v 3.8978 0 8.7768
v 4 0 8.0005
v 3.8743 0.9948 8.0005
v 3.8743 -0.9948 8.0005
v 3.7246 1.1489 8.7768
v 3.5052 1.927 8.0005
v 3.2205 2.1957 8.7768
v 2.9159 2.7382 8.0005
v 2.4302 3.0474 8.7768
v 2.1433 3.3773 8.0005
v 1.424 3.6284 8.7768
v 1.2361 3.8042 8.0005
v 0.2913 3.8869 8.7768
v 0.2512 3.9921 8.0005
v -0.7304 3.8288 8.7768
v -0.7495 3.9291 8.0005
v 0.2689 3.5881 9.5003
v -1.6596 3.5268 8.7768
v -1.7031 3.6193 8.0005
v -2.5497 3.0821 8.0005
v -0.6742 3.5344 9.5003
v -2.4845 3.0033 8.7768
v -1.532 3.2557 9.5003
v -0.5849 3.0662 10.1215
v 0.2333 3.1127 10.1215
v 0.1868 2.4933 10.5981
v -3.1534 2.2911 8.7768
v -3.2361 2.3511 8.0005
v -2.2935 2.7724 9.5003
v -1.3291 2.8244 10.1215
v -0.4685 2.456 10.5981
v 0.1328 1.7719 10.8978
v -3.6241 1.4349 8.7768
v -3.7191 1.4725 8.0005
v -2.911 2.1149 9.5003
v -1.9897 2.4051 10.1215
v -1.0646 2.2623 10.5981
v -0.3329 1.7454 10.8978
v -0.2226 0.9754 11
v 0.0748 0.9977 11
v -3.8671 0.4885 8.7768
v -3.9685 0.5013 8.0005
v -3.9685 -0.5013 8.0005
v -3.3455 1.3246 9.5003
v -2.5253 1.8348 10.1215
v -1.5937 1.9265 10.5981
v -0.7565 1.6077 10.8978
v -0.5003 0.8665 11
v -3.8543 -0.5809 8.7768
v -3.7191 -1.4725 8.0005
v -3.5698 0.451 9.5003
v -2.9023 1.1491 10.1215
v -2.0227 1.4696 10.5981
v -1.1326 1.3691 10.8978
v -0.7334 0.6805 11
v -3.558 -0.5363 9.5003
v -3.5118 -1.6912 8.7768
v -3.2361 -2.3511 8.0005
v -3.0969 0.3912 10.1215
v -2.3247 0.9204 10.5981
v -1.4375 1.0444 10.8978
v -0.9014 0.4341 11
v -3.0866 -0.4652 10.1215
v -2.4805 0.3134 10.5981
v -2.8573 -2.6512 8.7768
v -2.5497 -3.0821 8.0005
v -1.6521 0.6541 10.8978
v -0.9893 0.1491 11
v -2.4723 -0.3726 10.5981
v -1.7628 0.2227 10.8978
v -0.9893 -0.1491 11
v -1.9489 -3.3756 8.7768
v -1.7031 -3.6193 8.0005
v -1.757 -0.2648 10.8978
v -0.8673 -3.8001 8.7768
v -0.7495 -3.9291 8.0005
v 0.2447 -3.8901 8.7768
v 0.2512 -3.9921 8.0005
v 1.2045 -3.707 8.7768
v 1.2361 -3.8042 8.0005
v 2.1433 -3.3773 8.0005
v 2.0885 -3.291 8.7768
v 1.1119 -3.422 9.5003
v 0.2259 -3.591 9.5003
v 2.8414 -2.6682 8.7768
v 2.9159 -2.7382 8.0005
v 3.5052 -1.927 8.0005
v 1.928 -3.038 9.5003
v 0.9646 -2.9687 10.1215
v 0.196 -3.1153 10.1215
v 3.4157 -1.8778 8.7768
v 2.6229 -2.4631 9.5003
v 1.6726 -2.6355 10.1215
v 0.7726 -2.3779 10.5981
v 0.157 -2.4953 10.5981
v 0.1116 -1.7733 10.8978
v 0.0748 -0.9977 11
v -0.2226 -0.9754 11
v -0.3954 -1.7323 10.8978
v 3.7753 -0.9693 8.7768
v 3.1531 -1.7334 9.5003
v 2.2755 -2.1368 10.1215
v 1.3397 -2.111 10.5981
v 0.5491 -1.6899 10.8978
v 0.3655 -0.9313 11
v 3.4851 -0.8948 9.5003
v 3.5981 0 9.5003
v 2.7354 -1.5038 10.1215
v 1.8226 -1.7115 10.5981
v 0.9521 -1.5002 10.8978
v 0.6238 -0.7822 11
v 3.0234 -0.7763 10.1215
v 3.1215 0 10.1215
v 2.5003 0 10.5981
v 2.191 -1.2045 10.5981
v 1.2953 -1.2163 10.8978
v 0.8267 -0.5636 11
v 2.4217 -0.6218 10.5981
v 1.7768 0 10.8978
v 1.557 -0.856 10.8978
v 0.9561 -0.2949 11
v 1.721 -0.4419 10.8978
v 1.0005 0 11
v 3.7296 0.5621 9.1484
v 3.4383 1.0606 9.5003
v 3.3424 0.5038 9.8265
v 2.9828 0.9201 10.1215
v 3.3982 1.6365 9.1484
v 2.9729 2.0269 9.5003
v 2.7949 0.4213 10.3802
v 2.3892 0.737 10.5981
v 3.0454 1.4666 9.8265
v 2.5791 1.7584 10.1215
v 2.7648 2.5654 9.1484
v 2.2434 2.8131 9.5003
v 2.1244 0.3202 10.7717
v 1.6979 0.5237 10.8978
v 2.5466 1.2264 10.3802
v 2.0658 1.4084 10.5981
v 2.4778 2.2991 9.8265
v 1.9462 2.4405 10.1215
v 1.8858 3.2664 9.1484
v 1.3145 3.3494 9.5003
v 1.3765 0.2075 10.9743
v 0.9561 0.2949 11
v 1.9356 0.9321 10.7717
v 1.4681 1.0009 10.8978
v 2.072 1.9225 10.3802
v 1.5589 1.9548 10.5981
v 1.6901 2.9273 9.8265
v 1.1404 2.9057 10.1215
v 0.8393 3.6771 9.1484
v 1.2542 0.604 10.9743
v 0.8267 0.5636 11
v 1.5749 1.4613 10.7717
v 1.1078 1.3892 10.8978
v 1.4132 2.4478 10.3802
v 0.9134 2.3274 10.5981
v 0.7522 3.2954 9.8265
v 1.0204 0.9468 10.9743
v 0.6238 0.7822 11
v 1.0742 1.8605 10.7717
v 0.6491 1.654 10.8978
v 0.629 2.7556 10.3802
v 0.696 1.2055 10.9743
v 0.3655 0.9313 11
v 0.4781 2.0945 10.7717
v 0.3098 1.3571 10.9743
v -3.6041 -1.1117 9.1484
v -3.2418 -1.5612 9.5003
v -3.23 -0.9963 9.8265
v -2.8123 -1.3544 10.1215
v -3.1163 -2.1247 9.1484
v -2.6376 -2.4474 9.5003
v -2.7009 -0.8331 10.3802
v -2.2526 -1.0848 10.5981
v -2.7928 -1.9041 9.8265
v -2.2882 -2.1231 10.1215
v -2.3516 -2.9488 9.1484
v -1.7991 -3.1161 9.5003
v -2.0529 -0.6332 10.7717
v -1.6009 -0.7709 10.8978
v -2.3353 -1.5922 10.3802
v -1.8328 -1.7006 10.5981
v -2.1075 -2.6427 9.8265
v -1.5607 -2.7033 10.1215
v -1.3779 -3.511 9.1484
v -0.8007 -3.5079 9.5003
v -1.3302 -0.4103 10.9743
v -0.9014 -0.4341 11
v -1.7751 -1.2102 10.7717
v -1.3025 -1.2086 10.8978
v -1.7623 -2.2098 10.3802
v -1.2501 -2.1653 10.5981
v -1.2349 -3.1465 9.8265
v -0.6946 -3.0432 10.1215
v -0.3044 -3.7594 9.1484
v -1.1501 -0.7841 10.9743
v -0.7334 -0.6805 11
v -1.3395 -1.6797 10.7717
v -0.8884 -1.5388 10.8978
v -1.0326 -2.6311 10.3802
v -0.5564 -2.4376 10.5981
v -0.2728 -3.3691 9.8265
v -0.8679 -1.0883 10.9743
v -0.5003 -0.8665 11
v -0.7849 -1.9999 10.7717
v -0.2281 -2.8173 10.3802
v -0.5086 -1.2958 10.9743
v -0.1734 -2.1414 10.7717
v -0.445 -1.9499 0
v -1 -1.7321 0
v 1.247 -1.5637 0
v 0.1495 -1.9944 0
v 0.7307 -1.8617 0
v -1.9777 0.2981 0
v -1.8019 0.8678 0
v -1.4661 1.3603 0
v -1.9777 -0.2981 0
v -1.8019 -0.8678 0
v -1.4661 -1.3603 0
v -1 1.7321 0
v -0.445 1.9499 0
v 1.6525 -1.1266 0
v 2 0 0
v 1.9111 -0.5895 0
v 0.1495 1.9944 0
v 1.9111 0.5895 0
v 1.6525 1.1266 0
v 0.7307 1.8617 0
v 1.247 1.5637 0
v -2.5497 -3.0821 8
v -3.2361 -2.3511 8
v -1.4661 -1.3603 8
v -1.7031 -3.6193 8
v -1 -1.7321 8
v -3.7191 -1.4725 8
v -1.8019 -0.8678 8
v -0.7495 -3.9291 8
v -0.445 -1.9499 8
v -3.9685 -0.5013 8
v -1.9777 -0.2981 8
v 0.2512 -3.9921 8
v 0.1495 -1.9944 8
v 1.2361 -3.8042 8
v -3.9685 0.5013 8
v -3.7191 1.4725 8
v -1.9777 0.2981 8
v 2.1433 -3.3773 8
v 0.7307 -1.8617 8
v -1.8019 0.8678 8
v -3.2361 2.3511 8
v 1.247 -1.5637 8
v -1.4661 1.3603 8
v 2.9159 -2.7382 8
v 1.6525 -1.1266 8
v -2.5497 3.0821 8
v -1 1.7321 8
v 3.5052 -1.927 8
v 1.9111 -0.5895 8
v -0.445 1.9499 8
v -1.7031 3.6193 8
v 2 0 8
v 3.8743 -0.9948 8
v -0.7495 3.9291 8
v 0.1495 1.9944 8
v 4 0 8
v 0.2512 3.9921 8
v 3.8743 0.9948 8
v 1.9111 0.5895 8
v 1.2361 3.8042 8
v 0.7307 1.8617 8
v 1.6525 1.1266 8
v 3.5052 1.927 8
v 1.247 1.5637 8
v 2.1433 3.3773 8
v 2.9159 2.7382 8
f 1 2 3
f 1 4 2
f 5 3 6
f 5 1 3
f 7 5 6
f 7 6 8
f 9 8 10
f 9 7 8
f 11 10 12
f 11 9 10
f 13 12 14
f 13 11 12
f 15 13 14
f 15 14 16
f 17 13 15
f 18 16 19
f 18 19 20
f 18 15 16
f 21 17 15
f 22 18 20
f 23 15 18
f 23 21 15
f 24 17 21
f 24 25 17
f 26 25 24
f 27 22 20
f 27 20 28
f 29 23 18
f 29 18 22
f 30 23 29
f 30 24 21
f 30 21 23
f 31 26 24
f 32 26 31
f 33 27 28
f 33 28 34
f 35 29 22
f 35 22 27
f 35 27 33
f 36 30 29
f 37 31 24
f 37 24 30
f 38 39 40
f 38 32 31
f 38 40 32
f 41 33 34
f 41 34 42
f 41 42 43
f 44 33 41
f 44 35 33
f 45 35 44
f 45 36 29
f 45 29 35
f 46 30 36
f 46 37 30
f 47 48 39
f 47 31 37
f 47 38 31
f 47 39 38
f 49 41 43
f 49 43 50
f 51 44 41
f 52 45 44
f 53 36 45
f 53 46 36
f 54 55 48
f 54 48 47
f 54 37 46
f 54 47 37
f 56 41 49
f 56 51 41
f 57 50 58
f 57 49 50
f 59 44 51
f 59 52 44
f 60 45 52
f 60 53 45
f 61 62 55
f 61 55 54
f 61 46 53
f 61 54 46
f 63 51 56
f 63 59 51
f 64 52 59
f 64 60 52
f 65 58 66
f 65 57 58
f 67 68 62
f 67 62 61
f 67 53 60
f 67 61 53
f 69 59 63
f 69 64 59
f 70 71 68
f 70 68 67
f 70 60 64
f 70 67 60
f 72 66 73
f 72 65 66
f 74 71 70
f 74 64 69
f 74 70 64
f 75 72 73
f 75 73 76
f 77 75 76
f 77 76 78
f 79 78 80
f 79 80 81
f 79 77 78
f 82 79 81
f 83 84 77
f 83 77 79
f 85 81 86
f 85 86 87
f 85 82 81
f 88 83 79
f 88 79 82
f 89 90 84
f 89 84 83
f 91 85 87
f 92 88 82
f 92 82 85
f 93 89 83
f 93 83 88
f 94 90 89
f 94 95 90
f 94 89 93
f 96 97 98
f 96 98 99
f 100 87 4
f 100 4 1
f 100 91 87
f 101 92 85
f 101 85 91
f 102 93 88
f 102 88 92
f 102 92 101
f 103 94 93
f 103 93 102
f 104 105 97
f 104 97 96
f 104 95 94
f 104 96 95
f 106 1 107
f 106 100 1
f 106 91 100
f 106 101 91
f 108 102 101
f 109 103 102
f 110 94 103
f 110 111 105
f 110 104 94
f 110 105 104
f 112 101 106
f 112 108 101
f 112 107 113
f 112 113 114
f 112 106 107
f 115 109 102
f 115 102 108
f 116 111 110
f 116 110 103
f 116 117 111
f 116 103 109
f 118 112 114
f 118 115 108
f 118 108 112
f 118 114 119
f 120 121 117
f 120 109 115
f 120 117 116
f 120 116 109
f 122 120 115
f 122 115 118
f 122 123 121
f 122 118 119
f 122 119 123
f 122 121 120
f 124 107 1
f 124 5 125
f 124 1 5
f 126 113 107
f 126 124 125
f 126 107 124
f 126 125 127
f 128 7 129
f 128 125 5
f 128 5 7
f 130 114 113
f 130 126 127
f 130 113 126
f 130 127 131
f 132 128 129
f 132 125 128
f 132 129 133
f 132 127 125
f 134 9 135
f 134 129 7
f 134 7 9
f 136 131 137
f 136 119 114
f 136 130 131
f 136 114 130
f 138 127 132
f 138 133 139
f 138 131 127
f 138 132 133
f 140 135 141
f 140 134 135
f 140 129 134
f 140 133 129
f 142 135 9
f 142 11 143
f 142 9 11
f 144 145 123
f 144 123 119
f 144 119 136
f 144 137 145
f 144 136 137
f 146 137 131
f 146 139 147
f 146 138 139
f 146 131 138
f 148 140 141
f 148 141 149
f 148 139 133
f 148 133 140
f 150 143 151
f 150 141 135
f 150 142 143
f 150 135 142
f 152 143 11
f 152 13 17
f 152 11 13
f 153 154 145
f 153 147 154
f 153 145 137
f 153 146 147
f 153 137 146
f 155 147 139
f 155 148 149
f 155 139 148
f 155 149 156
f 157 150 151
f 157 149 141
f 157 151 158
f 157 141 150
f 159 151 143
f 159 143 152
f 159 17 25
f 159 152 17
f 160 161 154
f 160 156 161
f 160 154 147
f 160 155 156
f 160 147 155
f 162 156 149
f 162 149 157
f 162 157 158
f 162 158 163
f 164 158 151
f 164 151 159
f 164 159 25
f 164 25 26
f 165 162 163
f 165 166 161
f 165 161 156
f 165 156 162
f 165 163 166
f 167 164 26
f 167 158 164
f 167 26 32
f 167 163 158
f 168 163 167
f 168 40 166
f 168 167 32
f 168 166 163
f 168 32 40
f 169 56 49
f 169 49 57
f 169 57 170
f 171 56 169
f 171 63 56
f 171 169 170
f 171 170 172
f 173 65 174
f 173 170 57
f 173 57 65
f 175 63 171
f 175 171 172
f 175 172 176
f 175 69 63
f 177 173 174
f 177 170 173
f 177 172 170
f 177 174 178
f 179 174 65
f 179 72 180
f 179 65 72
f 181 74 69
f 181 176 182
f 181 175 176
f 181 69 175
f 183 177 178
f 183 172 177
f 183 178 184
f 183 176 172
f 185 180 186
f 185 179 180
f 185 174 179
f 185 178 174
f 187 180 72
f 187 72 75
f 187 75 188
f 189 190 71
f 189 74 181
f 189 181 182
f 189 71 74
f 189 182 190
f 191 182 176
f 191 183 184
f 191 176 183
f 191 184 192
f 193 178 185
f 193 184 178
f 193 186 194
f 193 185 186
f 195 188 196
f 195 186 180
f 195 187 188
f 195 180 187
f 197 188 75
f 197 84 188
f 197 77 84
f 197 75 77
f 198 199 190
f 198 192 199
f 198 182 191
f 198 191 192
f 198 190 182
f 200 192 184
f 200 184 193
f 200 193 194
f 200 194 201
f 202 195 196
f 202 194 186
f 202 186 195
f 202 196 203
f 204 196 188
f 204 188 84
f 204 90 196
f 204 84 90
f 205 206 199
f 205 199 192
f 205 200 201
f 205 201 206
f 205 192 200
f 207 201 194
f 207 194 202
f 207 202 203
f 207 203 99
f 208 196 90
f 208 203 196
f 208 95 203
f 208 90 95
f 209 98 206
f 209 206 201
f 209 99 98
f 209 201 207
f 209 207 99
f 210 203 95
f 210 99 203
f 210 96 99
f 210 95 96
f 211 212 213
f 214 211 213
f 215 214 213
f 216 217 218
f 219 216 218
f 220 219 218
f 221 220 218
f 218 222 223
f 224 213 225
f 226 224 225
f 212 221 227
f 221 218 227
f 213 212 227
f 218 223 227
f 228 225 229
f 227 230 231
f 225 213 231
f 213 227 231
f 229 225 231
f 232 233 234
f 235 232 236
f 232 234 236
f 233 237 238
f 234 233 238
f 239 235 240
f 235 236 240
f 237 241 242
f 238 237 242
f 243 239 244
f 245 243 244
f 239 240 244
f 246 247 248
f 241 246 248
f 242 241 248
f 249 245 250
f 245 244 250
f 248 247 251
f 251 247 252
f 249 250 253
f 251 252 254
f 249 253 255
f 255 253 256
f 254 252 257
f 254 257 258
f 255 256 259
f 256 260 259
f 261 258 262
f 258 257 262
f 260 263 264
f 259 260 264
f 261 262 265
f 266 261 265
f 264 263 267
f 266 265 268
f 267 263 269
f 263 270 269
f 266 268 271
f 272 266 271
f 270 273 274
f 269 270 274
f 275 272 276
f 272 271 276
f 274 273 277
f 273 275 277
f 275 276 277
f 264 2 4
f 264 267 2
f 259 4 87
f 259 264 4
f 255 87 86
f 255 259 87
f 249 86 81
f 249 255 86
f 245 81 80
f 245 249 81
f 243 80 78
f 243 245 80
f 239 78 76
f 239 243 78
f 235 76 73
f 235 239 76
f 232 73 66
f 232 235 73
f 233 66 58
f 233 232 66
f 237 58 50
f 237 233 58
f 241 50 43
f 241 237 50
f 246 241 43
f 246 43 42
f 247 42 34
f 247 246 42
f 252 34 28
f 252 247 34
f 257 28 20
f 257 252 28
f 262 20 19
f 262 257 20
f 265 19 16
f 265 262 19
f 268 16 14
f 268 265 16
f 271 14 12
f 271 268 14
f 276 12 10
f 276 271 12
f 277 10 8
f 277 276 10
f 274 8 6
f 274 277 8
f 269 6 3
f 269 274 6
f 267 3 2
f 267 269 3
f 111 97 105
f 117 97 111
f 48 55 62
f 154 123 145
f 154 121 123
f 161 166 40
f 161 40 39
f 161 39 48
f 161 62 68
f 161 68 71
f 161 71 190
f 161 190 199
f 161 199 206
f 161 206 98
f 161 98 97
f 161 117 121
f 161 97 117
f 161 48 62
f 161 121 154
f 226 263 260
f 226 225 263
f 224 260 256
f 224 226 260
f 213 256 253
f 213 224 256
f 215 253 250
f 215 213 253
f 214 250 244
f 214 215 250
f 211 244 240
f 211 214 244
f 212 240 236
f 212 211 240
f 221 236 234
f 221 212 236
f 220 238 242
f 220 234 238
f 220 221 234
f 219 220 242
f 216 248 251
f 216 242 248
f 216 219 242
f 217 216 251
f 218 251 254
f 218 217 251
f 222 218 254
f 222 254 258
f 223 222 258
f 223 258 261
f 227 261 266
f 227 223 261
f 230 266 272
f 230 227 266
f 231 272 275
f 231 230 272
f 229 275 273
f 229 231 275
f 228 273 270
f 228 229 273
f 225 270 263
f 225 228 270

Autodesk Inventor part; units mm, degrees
ref_plane "YZ Plane" through (0, 0, 0) normal (1, 0, 0) x (0, 1, 0)
ref_plane "XZ Plane" through (0, 0, 0) normal (0, 1, 0) x (-1, 0, 0)
ref_plane "XY Plane" through (0, 0, 0) normal (0, 0, 1) x (1, 0, 0)
sketch "スケッチ1" plane through (0, 0, 0) normal (0, 0, 1) x (1, 0, 0)
  circle A0 centre (0, 0) radius 2
  dimension "d0" = 4
extrude "押し出し1" add sketch "スケッチ1" along normal blind 8
sketch "スケッチ2" plane through (0, 0, 8) normal (0, 0, 1) x (1, 0, 0)
  circle A0 centre (0, 0) radius 2 projected
  circle A1 centre (0, 0) radius 4
  dimension "d3" = 8
extrude "押し出し2" add sketch "スケッチ2" along normal blind 3 contours A0 | A1
fillet "フィレット1" radius 3 1 edges at (-4, 0, 11)
thread "ねじ1" size "M4x0.7" class "6g" standard "ANSI Metric M Profile" full length
properties part number "SB　M4 8mm なべネジ" material "Stainless Steel, 440C"
